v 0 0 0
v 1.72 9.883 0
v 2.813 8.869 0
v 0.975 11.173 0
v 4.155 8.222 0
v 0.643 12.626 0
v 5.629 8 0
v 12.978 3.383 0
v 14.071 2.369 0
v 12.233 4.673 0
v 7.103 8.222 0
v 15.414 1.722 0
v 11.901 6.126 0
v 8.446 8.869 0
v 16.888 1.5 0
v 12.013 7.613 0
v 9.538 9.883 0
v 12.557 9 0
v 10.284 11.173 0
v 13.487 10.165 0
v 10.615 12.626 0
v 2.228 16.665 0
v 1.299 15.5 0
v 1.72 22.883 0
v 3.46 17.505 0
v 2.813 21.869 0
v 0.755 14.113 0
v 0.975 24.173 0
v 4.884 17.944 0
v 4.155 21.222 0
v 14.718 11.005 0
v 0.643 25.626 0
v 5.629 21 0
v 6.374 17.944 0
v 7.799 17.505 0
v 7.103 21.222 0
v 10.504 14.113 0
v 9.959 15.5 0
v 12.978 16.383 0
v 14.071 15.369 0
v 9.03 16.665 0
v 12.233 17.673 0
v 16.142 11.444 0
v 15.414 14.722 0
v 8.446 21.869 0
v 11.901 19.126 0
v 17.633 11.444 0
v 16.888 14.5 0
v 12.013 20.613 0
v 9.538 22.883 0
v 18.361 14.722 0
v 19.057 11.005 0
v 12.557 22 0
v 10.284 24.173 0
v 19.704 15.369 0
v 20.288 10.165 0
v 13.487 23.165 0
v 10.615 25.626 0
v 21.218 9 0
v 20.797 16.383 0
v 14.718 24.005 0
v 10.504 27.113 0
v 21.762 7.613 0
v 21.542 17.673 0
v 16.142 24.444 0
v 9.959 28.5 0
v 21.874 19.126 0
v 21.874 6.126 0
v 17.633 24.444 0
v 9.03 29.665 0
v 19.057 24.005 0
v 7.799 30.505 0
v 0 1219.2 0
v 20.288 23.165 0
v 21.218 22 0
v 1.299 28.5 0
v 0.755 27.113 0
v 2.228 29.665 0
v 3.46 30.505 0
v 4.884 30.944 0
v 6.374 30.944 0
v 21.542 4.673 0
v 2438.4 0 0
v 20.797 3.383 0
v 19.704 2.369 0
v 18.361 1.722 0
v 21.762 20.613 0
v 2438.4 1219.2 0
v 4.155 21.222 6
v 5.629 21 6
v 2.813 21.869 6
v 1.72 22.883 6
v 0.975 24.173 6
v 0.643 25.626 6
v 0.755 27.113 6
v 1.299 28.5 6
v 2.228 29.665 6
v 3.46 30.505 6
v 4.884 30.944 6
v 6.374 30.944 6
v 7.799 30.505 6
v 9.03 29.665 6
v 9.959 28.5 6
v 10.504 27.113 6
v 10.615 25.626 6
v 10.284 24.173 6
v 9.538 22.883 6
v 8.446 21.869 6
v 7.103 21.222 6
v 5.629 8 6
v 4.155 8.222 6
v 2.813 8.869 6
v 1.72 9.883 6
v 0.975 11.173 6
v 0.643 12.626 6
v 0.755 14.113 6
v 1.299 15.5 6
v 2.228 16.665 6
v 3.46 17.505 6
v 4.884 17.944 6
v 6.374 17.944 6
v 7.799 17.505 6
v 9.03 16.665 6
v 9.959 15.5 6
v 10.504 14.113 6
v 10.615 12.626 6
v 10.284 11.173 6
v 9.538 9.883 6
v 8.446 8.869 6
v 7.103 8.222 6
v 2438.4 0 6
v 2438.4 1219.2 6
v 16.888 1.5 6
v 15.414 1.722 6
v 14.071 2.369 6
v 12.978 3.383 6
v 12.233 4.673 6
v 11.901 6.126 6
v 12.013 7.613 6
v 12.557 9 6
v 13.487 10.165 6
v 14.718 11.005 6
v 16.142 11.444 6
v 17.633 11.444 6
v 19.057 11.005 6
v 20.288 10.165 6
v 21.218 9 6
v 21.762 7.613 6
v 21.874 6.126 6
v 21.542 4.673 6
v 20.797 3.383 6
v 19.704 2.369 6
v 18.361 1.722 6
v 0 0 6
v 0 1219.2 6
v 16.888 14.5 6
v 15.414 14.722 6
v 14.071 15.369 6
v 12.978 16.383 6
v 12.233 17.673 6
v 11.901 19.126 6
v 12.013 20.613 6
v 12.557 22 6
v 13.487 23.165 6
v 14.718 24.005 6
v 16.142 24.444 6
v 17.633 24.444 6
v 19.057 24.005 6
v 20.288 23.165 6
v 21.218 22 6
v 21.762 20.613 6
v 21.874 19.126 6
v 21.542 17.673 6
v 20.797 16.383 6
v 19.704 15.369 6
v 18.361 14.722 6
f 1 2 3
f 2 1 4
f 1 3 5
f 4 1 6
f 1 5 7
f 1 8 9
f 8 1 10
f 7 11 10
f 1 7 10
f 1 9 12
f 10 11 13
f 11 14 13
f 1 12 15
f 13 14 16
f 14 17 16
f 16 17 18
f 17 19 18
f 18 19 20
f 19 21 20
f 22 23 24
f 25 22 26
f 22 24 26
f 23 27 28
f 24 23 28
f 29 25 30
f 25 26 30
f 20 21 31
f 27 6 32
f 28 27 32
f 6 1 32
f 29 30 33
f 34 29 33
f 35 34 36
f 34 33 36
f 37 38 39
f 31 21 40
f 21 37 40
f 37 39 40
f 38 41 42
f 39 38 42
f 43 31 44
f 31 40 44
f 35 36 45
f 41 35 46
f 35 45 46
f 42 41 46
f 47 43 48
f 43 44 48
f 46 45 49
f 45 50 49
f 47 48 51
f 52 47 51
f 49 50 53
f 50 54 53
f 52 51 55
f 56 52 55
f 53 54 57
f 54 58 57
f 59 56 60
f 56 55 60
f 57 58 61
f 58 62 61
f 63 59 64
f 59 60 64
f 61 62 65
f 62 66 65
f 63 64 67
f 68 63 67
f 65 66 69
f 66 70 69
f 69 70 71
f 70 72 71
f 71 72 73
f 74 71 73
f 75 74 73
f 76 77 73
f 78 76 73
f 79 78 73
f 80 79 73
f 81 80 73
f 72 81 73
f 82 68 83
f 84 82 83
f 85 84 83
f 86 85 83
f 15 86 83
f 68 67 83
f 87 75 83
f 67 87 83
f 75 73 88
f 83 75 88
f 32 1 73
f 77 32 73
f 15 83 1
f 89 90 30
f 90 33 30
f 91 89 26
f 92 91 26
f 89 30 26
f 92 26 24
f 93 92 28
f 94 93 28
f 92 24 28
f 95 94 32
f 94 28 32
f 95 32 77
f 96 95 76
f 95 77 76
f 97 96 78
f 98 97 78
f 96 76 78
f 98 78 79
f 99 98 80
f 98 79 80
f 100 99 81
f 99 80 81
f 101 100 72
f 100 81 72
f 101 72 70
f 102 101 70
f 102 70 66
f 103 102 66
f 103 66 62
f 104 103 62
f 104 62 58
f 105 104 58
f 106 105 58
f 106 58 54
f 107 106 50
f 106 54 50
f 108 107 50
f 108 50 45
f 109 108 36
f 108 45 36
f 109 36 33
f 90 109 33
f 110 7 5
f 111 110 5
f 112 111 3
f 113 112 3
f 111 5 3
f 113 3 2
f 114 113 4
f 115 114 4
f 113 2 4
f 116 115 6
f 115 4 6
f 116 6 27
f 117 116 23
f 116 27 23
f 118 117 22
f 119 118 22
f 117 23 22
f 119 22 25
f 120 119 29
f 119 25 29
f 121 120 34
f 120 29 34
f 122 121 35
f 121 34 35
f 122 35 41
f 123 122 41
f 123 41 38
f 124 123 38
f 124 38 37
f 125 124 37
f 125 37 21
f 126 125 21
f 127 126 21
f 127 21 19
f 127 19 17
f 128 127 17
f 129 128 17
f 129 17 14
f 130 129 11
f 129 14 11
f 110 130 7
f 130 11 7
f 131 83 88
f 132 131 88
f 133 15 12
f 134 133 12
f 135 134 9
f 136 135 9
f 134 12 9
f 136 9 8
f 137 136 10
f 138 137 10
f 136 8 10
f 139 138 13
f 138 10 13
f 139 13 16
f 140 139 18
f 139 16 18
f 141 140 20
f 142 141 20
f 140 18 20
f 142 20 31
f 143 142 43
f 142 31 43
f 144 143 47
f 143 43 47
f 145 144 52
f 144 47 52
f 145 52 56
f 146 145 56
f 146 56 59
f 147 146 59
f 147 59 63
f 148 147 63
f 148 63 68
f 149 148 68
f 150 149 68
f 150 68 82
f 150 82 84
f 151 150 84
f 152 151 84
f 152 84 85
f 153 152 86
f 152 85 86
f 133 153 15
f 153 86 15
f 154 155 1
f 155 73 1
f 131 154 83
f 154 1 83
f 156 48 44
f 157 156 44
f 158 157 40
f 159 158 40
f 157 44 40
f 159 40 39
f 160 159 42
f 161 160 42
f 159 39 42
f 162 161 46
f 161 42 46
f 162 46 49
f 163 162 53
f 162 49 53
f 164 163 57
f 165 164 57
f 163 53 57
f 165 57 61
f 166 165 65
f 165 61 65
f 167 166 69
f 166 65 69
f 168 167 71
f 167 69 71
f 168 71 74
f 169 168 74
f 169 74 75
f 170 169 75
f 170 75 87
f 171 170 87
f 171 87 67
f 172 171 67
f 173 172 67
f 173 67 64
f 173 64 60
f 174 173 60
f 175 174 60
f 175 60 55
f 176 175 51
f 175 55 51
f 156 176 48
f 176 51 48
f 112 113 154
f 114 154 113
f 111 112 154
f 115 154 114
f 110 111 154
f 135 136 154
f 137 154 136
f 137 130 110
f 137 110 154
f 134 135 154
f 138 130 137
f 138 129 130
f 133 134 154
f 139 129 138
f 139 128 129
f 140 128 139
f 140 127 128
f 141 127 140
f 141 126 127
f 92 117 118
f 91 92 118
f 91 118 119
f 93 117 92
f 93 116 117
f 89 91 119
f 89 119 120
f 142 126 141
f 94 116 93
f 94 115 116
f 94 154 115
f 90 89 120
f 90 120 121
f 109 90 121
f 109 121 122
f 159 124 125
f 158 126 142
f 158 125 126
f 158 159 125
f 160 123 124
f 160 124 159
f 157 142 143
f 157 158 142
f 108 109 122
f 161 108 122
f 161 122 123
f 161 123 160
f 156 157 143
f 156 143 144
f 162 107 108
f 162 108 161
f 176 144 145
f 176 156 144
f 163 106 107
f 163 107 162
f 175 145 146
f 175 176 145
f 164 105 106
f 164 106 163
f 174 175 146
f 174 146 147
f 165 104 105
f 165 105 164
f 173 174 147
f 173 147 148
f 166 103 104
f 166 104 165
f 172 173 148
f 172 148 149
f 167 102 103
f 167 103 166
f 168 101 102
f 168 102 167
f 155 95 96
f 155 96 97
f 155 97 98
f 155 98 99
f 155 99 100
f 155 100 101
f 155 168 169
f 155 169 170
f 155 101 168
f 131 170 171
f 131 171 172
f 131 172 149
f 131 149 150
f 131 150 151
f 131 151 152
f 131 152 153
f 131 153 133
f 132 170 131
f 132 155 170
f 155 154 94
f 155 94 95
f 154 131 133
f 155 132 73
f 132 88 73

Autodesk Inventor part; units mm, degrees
ref_plane "YZ Plane" through (0, 0, 0) normal (1, 0, 0) x (0, 1, 0)
ref_plane "XZ Plane" through (0, 0, 0) normal (0, 1, 0) x (-1, 0, 0)
ref_plane "XY Plane" through (0, 0, 0) normal (0, 0, 1) x (1, 0, 0)
sketch "Sketch1" plane through (0, 0, 0) normal (0, 0, 1) x (1, 0, 0)
  line L0 (0, 0) -> (2438.4, 0)
  line L1 (2438.4, 0) -> (2438.4, 1219.2)
  line L2 (2438.4, 1219.2) -> (0, 1219.2)
  line L3 (0, 1219.2) -> (0, 0)
  dimension "d0" = 2438.4
  dimension "d1" = 1219.2
extrude "Extrusion1" add sketch "Sketch1" along normal blind 6
sketch "Sketch2" plane through (0, 0, 6) normal (0, 0, 1) x (1, 0, 0)
  line L0 (16.8875, 6.5) -> (16.8875, 19.5) construction
  line L1 (16.8875, 19.5) -> (5.6292, 13) construction
  line L2 (5.6292, 13) -> (16.8875, 6.5) construction
  line L3 (0, 0) -> (2438.4, 0) projected
  line L4 (0, 1219.2) -> (0, 0) projected
  line L5 (5.6292, 13) -> (5.6292, 26) construction
  line L6 (5.6292, 26) -> (16.8875, 19.5) construction
  dimension "Y_space" = 13
  dimension "d5" = 6.5
  dimension "d6" = 5.6292
  dimension "X_space" = 11.2583
hole "Hole1" at (5.6292, 13, 6) at (16.8875, 19.5, 6) at (16.8875, 6.5, 6) at (5.6292, 26, 6) direction (0, 0, -1) diameter 10 end through all
equation "\"d5\" = 0.5 * Y_space"
equation "\"d6\" = 0.5 * X_space"
properties part number "Drilled plate"
